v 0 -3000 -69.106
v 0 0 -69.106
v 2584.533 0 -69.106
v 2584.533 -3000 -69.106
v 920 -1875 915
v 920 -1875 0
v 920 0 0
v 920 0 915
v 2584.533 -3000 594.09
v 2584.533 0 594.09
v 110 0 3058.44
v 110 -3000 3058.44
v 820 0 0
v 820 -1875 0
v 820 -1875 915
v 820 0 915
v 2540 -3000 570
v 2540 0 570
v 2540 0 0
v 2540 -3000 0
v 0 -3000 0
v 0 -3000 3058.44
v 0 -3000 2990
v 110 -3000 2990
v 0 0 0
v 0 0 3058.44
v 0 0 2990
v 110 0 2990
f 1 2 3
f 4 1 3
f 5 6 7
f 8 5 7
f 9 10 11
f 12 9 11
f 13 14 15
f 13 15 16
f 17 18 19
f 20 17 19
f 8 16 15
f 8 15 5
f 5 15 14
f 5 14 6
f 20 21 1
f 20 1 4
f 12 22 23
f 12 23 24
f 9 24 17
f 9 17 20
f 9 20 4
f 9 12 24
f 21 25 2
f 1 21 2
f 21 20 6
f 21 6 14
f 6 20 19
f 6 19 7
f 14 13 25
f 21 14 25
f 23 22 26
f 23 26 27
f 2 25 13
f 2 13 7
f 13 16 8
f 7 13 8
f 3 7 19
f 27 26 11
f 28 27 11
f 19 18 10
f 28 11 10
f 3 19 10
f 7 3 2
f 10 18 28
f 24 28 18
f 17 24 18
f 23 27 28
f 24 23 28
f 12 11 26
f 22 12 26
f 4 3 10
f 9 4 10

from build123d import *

# Parameters (mm, degrees)
F1_DEPTH = 3000
F2_W     = 100
F2_H     = 1875
F3_DEPTH = 915


with BuildPart() as f1:
    # F0 (on Front) → F1 (new body)
    with BuildSketch(Plane.XZ):
        Polygon((2540, 0), (0, 0), (0, -69.106162), (2584.532759, -69.106162), (2584.532759, 594.090235), (110, 3058.439732), (0, 3058.439732), (0, 2990), (110, 2990), (2540, 570), align=None)
    extrude(amount=F1_DEPTH)

    # F2 (on face) → F3 (join)
    with BuildSketch(Plane.XY):
        with Locations((870, -937.5)):
            Rectangle(F2_W, F2_H)
    extrude(amount=F3_DEPTH)


solid = f1.part
